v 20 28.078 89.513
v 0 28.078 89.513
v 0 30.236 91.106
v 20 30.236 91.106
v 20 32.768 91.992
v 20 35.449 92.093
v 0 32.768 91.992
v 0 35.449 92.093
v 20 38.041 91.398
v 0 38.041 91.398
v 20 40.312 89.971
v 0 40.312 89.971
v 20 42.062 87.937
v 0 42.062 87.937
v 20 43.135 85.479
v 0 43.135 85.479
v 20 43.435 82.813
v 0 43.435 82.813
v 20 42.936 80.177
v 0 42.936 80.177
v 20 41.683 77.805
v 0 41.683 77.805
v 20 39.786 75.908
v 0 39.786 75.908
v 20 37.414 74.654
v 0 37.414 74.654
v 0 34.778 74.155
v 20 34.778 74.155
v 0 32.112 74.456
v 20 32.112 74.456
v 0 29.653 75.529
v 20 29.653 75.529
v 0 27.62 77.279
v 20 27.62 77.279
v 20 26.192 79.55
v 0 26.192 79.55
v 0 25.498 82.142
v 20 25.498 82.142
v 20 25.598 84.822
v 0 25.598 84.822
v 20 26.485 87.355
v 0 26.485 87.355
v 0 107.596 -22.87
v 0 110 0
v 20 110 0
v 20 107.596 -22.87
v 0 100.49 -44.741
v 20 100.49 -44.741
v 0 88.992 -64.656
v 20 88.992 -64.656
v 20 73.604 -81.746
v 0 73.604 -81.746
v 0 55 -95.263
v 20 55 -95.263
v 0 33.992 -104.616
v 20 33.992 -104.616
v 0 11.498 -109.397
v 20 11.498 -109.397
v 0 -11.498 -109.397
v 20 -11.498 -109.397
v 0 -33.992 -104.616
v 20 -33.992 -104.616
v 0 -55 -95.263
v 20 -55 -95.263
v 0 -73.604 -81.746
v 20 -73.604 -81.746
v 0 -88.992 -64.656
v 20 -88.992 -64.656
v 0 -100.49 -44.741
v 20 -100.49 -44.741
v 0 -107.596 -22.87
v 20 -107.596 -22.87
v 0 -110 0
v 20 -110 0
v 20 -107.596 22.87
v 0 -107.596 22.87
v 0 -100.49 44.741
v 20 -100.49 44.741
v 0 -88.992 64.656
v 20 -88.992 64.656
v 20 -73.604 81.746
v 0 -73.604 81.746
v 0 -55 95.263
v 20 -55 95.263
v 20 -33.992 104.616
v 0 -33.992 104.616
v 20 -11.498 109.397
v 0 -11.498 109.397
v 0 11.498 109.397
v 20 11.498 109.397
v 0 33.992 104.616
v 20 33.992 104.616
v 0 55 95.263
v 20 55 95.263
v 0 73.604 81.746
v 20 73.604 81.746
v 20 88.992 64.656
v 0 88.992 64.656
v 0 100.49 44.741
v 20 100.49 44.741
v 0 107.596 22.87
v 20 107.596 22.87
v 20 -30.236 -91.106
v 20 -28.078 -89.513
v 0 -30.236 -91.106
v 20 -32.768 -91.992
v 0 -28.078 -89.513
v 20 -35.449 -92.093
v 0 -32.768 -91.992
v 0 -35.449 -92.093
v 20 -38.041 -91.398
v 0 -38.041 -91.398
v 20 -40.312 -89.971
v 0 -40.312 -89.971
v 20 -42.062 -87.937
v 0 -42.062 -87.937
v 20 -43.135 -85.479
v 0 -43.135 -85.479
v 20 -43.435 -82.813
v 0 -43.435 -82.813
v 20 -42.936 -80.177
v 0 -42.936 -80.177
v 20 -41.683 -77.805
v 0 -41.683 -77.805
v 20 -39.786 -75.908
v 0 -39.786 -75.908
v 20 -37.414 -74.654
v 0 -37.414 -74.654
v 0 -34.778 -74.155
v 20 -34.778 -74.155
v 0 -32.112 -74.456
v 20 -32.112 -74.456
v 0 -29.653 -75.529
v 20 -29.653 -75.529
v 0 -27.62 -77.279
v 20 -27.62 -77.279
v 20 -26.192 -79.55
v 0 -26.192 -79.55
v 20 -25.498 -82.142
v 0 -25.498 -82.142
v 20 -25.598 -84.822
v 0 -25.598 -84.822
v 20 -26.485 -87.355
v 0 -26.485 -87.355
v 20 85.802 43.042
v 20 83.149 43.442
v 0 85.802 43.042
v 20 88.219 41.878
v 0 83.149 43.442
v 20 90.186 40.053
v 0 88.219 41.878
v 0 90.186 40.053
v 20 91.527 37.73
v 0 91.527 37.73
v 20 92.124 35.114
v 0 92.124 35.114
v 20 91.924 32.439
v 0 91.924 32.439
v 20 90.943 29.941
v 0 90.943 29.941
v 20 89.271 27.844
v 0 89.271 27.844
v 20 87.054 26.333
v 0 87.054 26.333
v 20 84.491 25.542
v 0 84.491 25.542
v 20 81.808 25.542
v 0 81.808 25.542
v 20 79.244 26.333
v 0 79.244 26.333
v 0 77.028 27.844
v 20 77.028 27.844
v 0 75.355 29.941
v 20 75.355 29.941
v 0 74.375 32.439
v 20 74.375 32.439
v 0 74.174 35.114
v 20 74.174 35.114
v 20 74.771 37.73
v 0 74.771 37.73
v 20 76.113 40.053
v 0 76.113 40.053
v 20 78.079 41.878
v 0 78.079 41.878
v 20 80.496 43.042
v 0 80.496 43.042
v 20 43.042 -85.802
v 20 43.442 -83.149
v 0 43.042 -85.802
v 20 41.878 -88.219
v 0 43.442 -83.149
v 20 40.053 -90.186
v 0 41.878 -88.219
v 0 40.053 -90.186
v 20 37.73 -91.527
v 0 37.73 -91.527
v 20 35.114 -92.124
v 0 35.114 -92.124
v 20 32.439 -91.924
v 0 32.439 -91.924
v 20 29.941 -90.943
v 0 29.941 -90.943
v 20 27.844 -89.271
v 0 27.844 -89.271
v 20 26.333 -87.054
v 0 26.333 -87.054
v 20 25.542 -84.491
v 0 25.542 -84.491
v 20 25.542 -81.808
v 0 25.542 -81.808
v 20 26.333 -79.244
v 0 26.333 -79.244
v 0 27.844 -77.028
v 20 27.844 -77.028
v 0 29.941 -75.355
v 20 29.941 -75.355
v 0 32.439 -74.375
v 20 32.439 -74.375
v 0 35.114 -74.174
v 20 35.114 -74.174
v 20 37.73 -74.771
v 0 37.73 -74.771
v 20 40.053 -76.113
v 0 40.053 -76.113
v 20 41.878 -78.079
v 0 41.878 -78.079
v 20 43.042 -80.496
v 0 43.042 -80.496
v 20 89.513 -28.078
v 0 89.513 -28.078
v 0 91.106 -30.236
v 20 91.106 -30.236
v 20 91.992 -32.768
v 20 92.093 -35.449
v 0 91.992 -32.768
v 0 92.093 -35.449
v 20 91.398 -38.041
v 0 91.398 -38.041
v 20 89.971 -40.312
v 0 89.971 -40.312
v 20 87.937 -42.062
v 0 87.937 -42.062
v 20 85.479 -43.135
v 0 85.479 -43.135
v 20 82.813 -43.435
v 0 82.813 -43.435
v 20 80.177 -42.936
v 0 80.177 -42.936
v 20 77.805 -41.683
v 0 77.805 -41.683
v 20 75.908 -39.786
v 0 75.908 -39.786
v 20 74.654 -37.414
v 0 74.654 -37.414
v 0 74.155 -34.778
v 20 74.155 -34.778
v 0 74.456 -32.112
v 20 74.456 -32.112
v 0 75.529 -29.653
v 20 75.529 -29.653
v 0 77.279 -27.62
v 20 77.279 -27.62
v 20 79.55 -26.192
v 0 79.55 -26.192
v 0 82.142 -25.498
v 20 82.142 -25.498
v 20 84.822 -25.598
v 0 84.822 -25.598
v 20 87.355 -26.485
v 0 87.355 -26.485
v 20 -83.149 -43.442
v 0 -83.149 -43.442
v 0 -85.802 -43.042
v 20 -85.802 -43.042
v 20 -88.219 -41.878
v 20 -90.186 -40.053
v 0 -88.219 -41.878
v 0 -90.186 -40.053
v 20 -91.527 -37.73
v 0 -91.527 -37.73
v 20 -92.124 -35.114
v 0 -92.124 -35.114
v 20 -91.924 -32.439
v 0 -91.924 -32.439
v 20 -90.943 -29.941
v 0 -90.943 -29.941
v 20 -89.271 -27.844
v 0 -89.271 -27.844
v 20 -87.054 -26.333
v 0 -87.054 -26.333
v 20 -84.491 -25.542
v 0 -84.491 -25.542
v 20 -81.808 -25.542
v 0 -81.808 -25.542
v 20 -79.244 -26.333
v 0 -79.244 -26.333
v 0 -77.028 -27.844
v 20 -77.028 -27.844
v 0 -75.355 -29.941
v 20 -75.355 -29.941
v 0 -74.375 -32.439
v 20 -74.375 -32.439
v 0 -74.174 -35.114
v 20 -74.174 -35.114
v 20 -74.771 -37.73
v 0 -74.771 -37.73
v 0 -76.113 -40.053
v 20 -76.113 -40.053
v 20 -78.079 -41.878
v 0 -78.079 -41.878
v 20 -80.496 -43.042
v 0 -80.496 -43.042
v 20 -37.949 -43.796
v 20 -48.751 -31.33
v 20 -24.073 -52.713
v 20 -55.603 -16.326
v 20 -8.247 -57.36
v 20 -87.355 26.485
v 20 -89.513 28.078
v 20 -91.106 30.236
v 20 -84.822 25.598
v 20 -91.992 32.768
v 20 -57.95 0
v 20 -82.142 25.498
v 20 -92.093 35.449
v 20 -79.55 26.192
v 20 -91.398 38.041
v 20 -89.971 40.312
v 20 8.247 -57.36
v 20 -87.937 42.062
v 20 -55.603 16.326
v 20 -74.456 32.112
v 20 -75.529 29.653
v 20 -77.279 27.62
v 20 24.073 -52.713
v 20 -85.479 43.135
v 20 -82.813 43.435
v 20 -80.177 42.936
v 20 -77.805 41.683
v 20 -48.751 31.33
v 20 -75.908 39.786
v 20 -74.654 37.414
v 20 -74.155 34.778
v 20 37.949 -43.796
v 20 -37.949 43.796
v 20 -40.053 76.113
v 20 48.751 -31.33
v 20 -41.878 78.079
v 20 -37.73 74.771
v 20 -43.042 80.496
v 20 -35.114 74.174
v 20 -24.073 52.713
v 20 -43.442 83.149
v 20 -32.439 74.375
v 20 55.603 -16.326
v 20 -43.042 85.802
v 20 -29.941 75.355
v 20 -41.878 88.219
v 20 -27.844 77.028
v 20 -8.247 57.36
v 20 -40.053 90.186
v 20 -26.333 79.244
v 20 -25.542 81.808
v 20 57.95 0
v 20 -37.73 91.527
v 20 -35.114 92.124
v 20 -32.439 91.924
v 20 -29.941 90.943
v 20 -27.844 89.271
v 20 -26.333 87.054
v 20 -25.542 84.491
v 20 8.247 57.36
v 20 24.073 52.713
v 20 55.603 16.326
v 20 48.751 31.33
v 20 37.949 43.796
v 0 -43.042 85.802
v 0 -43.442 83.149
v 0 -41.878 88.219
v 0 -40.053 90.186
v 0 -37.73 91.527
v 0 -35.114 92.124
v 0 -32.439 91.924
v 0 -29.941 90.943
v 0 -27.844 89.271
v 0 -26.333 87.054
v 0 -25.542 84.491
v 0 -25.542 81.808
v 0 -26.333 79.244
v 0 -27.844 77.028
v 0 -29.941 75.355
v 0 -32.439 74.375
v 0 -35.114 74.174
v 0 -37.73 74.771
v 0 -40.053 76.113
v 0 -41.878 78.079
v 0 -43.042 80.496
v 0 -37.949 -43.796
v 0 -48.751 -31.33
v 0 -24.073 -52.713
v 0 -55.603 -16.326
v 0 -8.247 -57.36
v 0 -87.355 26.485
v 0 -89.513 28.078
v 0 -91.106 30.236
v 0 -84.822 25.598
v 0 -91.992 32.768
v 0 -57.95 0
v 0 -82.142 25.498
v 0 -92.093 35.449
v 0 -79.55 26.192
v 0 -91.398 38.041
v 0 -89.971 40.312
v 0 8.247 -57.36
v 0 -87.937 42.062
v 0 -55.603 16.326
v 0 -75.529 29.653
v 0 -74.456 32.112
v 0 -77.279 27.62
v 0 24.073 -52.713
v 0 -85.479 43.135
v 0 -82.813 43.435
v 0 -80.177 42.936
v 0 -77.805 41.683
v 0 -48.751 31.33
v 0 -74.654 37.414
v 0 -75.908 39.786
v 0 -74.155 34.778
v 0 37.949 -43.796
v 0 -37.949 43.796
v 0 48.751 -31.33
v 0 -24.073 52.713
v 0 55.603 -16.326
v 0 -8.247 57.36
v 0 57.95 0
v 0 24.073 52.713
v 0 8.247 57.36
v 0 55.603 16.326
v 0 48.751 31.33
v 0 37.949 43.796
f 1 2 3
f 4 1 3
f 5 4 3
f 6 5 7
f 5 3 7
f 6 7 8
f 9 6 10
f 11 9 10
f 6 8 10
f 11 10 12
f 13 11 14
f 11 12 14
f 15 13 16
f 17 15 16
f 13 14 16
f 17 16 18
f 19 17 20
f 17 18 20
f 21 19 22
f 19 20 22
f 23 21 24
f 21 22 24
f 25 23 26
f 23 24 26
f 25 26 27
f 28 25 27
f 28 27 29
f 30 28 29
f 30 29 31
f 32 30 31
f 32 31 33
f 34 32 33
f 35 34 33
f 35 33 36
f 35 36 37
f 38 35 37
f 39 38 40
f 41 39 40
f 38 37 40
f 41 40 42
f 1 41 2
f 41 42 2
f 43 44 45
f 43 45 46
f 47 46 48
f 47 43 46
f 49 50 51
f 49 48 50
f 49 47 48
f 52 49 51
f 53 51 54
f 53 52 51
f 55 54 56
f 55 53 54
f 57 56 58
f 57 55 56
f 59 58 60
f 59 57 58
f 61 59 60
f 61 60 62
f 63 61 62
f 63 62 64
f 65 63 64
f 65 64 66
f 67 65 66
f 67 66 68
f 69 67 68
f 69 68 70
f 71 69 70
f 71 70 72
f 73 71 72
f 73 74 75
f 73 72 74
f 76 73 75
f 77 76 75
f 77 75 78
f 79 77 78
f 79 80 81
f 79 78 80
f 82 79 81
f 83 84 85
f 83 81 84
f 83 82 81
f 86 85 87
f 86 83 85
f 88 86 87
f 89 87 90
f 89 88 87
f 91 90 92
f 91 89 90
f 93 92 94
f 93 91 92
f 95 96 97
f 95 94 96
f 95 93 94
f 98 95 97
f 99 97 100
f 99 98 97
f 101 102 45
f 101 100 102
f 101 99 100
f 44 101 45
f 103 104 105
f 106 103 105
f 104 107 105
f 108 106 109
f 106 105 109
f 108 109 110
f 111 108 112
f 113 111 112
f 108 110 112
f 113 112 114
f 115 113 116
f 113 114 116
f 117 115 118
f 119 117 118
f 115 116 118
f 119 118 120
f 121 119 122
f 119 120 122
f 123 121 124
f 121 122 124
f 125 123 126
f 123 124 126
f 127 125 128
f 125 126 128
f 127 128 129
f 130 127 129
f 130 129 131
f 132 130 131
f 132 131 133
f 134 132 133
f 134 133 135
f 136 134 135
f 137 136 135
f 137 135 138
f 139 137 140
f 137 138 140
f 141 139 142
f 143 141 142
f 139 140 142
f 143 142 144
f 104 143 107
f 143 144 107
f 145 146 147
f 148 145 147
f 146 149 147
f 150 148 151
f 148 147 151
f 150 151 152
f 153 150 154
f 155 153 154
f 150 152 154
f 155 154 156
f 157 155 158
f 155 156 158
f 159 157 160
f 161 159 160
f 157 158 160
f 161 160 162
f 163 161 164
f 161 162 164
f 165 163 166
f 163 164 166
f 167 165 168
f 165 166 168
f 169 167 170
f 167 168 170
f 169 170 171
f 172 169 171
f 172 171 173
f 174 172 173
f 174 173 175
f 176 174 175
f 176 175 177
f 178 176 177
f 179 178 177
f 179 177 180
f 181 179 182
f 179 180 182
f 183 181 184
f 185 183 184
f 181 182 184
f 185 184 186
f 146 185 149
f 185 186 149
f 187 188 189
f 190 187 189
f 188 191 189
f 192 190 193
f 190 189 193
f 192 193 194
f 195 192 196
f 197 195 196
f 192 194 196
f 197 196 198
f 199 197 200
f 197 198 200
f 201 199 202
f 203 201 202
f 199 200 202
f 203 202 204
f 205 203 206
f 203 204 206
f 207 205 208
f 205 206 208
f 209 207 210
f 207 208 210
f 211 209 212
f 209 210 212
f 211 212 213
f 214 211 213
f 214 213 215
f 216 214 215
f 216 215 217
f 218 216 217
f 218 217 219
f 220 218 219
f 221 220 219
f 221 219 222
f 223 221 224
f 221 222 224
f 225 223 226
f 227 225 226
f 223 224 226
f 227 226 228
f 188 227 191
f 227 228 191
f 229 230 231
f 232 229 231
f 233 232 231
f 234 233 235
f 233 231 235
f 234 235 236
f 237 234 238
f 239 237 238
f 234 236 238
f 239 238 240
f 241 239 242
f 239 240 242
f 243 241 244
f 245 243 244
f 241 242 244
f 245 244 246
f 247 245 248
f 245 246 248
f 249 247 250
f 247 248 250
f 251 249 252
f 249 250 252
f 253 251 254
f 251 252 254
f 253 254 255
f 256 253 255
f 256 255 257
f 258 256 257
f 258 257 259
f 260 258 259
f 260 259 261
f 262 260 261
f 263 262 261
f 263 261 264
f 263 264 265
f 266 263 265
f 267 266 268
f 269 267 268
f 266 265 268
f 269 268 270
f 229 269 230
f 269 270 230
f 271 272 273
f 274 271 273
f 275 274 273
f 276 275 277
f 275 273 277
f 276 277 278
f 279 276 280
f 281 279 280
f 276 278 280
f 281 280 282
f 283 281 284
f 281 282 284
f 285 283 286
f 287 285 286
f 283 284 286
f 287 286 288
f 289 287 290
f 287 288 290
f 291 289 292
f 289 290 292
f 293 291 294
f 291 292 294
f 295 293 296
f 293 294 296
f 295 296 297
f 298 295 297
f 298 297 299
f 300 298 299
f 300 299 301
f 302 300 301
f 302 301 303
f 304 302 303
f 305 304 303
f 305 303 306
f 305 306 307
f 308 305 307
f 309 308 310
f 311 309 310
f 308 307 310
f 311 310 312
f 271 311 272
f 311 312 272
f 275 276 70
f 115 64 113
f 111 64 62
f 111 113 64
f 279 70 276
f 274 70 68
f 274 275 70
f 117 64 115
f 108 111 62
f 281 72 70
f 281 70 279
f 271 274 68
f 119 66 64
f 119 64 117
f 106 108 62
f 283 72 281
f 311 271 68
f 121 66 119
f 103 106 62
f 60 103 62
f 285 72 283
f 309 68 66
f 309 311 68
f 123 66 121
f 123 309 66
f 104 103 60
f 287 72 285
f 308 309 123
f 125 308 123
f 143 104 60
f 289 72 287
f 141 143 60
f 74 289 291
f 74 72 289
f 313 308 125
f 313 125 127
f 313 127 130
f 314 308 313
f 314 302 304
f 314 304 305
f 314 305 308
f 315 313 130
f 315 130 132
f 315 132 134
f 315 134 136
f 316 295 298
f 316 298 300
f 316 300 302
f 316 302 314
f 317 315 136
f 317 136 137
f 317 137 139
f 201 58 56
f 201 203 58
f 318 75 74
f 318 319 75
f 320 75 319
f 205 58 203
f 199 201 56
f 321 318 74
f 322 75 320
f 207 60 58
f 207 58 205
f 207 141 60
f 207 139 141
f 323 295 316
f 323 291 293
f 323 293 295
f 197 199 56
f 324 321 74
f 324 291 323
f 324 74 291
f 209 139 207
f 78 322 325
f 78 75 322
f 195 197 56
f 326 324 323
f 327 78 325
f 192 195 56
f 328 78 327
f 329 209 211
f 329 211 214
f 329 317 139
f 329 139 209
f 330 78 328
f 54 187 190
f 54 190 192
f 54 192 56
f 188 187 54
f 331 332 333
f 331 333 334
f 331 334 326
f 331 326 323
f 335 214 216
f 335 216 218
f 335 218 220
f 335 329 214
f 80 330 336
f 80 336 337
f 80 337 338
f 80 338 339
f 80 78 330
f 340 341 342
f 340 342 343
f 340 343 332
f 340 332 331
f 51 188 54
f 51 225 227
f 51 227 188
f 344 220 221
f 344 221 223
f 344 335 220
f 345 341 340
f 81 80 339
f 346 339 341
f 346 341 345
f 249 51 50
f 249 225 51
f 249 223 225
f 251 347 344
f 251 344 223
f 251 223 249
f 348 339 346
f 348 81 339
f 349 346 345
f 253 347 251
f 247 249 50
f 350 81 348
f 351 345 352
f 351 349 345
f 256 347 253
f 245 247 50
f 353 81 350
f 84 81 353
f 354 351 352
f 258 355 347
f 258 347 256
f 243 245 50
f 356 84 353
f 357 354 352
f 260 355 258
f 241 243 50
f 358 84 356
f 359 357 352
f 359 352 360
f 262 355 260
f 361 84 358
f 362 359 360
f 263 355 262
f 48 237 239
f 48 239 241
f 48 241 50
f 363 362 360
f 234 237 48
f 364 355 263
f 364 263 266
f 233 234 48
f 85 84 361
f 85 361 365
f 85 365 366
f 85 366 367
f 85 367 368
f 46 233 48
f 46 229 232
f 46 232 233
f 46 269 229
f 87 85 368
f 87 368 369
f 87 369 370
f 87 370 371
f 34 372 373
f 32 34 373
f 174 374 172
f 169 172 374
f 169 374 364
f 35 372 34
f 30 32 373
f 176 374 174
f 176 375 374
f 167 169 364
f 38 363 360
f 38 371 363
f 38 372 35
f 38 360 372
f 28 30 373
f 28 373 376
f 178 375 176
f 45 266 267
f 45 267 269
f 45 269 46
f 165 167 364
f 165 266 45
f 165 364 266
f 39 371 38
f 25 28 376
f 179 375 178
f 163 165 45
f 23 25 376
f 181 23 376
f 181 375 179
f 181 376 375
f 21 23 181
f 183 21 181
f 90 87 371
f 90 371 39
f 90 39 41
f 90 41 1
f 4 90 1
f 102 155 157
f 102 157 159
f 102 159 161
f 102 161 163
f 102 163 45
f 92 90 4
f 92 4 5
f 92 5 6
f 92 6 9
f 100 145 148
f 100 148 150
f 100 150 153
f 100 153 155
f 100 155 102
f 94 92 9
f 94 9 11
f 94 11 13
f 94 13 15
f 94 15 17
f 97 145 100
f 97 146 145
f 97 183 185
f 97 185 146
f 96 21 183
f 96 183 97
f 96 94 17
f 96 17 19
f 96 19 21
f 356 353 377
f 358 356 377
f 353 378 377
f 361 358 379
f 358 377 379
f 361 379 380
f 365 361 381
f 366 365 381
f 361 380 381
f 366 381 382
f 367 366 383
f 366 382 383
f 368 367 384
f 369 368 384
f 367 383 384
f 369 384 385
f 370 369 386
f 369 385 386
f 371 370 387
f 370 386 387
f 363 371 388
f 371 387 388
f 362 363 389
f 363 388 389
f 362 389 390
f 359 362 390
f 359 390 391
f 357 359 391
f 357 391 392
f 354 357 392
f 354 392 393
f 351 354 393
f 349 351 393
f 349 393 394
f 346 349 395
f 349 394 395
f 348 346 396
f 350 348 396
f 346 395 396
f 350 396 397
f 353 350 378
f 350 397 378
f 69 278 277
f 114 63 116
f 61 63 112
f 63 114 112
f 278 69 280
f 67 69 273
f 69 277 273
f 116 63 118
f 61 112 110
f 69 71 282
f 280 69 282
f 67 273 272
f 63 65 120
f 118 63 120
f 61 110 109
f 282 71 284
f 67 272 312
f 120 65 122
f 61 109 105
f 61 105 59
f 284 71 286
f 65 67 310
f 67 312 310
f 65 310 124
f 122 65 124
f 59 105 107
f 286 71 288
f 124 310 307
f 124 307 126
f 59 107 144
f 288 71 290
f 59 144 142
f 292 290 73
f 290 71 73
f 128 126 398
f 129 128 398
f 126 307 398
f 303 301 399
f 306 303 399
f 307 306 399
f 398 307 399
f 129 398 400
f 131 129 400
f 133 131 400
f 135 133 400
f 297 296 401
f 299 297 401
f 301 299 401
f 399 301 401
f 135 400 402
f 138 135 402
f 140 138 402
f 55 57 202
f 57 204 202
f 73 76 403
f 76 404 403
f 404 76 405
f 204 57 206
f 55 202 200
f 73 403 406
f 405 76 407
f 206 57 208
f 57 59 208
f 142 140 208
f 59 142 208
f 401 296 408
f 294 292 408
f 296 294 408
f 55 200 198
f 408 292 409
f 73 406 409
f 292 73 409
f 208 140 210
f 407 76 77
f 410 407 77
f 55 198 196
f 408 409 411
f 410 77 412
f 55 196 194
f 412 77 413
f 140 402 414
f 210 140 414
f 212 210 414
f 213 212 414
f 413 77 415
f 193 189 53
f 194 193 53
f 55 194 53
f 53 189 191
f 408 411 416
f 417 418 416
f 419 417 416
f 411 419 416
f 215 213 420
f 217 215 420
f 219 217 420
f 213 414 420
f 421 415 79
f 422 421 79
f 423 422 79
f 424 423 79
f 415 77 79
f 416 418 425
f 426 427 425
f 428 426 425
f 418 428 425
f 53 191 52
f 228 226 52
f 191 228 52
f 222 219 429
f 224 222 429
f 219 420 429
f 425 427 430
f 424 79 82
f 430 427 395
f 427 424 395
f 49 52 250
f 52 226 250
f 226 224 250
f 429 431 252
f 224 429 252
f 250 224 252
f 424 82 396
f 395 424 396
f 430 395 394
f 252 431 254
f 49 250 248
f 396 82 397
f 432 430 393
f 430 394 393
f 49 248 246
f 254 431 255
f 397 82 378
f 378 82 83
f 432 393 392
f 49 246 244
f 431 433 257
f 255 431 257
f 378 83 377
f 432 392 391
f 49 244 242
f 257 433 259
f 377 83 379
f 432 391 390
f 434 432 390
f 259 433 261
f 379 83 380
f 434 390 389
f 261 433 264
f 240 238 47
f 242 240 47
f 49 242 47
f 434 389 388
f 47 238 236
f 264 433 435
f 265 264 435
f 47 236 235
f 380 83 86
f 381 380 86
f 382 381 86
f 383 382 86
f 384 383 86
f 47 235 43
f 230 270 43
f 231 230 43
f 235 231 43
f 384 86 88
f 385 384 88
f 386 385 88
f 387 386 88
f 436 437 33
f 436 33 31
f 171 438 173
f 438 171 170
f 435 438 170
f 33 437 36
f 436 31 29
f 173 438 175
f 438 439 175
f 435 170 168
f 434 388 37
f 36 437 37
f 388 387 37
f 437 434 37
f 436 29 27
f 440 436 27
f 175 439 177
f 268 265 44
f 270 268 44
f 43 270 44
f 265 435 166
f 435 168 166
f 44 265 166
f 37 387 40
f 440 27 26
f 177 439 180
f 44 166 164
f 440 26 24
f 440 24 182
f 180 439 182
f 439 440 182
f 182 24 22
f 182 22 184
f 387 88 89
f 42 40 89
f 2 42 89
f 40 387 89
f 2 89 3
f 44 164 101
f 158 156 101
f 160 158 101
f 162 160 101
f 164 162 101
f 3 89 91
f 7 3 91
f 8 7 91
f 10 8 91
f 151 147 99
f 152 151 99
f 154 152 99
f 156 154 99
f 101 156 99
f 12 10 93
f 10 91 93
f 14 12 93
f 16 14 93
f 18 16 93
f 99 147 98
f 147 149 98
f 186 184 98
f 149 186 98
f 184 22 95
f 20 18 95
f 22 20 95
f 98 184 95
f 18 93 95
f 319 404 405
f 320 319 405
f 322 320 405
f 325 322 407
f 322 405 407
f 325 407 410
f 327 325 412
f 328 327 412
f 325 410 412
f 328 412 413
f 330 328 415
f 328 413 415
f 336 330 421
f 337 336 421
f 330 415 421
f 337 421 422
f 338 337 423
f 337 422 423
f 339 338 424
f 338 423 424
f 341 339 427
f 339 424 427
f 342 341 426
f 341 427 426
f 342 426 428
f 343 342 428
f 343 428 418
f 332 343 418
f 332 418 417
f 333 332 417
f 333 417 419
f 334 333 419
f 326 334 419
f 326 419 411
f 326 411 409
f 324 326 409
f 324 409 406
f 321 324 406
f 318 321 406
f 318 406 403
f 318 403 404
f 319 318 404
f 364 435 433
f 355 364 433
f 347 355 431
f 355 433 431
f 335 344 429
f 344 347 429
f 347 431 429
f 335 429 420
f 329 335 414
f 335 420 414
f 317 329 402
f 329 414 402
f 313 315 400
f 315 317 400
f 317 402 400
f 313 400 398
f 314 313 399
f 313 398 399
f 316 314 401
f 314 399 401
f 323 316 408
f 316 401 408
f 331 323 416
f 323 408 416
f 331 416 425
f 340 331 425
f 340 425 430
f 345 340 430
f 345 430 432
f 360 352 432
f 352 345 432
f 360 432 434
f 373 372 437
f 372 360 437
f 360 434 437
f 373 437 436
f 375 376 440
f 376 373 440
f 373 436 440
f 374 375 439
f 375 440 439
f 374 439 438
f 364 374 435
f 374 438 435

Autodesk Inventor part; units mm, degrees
ref_plane "YZ Plane" through (0, 0, 0) normal (1, 0, 0) x (0, 1, 0)
ref_plane "XZ Plane" through (0, 0, 0) normal (0, 1, 0) x (-1, 0, 0)
ref_plane "XY Plane" through (0, 0, 0) normal (0, 0, 1) x (1, 0, 0)
sketch "Sketch1" plane through (0, 0, 0) normal (0, 0, 1) x (1, 0, 0)
  line L0 (20, 110) -> (0, 110)
  line L1 (0, 110) -> (0, 57.95)
  line L2 (0, 57.95) -> (0, 0) construction
  line L3 (0, 0) -> (20, 0) construction
  line L4 (20, 110) -> (20, 57.95)
  line L5 (20, 57.95) -> (0, 57.95)
  line L6 (20, 57.95) -> (20, 0) construction
  dimension "d0" = 220
  dimension "d1" = 20
  dimension "d5" = 115.9
revolve "Revolution1" add sketch "Sketch1" angle 360 about axis through (0, 0, 0) along (1, 0, 0)
sketch "Sketch2" plane through (0, 0, 0) normal (-1, 0, 0) x (0, 0, 1)
  circle A0 centre (0, 0) radius 57.95 projected
  line L0 (0, 90) -> (0, 0) construction
  circle A1 centre (0, 0) radius 110 projected
  circle A2 centre (0, 0) radius 90 construction
  line L1 (0, 0) -> (34.4415, 83.1492) construction
  circle A3 centre (34.4415, 83.1492) radius 9
  dimension "d6" = 18
  dimension "d7" = 90
  dimension "d8" = 22.5
extrude "Extrusion1" cut sketch "Sketch2" against normal through all contours A3
pattern_circular "Circular Pattern1" count 8 over 360 about axis through (10, 0, 0) along (1, 0, 0) of "Extrusion1"
equation "\"d6\" = dd2"
equation "\"d7\" = 0.5 * k"
equation "\"d0\" = D"
equation "\"d1\" = b"
equation "\"d5\" = dd5"
equation "\"b\" = 20"
equation "\"D\" = 220"
equation "\"dd2\" = 18"
equation "\"dd5\" = 115.9"
equation "\"Size_Designation\" = 1.2345"
equation "\"k\" = 180"
properties part number "DIN 2576 Slip-On Flange for Welding Series 1 (ISO) - PN 10 100 x 114.3" material "Steel"
